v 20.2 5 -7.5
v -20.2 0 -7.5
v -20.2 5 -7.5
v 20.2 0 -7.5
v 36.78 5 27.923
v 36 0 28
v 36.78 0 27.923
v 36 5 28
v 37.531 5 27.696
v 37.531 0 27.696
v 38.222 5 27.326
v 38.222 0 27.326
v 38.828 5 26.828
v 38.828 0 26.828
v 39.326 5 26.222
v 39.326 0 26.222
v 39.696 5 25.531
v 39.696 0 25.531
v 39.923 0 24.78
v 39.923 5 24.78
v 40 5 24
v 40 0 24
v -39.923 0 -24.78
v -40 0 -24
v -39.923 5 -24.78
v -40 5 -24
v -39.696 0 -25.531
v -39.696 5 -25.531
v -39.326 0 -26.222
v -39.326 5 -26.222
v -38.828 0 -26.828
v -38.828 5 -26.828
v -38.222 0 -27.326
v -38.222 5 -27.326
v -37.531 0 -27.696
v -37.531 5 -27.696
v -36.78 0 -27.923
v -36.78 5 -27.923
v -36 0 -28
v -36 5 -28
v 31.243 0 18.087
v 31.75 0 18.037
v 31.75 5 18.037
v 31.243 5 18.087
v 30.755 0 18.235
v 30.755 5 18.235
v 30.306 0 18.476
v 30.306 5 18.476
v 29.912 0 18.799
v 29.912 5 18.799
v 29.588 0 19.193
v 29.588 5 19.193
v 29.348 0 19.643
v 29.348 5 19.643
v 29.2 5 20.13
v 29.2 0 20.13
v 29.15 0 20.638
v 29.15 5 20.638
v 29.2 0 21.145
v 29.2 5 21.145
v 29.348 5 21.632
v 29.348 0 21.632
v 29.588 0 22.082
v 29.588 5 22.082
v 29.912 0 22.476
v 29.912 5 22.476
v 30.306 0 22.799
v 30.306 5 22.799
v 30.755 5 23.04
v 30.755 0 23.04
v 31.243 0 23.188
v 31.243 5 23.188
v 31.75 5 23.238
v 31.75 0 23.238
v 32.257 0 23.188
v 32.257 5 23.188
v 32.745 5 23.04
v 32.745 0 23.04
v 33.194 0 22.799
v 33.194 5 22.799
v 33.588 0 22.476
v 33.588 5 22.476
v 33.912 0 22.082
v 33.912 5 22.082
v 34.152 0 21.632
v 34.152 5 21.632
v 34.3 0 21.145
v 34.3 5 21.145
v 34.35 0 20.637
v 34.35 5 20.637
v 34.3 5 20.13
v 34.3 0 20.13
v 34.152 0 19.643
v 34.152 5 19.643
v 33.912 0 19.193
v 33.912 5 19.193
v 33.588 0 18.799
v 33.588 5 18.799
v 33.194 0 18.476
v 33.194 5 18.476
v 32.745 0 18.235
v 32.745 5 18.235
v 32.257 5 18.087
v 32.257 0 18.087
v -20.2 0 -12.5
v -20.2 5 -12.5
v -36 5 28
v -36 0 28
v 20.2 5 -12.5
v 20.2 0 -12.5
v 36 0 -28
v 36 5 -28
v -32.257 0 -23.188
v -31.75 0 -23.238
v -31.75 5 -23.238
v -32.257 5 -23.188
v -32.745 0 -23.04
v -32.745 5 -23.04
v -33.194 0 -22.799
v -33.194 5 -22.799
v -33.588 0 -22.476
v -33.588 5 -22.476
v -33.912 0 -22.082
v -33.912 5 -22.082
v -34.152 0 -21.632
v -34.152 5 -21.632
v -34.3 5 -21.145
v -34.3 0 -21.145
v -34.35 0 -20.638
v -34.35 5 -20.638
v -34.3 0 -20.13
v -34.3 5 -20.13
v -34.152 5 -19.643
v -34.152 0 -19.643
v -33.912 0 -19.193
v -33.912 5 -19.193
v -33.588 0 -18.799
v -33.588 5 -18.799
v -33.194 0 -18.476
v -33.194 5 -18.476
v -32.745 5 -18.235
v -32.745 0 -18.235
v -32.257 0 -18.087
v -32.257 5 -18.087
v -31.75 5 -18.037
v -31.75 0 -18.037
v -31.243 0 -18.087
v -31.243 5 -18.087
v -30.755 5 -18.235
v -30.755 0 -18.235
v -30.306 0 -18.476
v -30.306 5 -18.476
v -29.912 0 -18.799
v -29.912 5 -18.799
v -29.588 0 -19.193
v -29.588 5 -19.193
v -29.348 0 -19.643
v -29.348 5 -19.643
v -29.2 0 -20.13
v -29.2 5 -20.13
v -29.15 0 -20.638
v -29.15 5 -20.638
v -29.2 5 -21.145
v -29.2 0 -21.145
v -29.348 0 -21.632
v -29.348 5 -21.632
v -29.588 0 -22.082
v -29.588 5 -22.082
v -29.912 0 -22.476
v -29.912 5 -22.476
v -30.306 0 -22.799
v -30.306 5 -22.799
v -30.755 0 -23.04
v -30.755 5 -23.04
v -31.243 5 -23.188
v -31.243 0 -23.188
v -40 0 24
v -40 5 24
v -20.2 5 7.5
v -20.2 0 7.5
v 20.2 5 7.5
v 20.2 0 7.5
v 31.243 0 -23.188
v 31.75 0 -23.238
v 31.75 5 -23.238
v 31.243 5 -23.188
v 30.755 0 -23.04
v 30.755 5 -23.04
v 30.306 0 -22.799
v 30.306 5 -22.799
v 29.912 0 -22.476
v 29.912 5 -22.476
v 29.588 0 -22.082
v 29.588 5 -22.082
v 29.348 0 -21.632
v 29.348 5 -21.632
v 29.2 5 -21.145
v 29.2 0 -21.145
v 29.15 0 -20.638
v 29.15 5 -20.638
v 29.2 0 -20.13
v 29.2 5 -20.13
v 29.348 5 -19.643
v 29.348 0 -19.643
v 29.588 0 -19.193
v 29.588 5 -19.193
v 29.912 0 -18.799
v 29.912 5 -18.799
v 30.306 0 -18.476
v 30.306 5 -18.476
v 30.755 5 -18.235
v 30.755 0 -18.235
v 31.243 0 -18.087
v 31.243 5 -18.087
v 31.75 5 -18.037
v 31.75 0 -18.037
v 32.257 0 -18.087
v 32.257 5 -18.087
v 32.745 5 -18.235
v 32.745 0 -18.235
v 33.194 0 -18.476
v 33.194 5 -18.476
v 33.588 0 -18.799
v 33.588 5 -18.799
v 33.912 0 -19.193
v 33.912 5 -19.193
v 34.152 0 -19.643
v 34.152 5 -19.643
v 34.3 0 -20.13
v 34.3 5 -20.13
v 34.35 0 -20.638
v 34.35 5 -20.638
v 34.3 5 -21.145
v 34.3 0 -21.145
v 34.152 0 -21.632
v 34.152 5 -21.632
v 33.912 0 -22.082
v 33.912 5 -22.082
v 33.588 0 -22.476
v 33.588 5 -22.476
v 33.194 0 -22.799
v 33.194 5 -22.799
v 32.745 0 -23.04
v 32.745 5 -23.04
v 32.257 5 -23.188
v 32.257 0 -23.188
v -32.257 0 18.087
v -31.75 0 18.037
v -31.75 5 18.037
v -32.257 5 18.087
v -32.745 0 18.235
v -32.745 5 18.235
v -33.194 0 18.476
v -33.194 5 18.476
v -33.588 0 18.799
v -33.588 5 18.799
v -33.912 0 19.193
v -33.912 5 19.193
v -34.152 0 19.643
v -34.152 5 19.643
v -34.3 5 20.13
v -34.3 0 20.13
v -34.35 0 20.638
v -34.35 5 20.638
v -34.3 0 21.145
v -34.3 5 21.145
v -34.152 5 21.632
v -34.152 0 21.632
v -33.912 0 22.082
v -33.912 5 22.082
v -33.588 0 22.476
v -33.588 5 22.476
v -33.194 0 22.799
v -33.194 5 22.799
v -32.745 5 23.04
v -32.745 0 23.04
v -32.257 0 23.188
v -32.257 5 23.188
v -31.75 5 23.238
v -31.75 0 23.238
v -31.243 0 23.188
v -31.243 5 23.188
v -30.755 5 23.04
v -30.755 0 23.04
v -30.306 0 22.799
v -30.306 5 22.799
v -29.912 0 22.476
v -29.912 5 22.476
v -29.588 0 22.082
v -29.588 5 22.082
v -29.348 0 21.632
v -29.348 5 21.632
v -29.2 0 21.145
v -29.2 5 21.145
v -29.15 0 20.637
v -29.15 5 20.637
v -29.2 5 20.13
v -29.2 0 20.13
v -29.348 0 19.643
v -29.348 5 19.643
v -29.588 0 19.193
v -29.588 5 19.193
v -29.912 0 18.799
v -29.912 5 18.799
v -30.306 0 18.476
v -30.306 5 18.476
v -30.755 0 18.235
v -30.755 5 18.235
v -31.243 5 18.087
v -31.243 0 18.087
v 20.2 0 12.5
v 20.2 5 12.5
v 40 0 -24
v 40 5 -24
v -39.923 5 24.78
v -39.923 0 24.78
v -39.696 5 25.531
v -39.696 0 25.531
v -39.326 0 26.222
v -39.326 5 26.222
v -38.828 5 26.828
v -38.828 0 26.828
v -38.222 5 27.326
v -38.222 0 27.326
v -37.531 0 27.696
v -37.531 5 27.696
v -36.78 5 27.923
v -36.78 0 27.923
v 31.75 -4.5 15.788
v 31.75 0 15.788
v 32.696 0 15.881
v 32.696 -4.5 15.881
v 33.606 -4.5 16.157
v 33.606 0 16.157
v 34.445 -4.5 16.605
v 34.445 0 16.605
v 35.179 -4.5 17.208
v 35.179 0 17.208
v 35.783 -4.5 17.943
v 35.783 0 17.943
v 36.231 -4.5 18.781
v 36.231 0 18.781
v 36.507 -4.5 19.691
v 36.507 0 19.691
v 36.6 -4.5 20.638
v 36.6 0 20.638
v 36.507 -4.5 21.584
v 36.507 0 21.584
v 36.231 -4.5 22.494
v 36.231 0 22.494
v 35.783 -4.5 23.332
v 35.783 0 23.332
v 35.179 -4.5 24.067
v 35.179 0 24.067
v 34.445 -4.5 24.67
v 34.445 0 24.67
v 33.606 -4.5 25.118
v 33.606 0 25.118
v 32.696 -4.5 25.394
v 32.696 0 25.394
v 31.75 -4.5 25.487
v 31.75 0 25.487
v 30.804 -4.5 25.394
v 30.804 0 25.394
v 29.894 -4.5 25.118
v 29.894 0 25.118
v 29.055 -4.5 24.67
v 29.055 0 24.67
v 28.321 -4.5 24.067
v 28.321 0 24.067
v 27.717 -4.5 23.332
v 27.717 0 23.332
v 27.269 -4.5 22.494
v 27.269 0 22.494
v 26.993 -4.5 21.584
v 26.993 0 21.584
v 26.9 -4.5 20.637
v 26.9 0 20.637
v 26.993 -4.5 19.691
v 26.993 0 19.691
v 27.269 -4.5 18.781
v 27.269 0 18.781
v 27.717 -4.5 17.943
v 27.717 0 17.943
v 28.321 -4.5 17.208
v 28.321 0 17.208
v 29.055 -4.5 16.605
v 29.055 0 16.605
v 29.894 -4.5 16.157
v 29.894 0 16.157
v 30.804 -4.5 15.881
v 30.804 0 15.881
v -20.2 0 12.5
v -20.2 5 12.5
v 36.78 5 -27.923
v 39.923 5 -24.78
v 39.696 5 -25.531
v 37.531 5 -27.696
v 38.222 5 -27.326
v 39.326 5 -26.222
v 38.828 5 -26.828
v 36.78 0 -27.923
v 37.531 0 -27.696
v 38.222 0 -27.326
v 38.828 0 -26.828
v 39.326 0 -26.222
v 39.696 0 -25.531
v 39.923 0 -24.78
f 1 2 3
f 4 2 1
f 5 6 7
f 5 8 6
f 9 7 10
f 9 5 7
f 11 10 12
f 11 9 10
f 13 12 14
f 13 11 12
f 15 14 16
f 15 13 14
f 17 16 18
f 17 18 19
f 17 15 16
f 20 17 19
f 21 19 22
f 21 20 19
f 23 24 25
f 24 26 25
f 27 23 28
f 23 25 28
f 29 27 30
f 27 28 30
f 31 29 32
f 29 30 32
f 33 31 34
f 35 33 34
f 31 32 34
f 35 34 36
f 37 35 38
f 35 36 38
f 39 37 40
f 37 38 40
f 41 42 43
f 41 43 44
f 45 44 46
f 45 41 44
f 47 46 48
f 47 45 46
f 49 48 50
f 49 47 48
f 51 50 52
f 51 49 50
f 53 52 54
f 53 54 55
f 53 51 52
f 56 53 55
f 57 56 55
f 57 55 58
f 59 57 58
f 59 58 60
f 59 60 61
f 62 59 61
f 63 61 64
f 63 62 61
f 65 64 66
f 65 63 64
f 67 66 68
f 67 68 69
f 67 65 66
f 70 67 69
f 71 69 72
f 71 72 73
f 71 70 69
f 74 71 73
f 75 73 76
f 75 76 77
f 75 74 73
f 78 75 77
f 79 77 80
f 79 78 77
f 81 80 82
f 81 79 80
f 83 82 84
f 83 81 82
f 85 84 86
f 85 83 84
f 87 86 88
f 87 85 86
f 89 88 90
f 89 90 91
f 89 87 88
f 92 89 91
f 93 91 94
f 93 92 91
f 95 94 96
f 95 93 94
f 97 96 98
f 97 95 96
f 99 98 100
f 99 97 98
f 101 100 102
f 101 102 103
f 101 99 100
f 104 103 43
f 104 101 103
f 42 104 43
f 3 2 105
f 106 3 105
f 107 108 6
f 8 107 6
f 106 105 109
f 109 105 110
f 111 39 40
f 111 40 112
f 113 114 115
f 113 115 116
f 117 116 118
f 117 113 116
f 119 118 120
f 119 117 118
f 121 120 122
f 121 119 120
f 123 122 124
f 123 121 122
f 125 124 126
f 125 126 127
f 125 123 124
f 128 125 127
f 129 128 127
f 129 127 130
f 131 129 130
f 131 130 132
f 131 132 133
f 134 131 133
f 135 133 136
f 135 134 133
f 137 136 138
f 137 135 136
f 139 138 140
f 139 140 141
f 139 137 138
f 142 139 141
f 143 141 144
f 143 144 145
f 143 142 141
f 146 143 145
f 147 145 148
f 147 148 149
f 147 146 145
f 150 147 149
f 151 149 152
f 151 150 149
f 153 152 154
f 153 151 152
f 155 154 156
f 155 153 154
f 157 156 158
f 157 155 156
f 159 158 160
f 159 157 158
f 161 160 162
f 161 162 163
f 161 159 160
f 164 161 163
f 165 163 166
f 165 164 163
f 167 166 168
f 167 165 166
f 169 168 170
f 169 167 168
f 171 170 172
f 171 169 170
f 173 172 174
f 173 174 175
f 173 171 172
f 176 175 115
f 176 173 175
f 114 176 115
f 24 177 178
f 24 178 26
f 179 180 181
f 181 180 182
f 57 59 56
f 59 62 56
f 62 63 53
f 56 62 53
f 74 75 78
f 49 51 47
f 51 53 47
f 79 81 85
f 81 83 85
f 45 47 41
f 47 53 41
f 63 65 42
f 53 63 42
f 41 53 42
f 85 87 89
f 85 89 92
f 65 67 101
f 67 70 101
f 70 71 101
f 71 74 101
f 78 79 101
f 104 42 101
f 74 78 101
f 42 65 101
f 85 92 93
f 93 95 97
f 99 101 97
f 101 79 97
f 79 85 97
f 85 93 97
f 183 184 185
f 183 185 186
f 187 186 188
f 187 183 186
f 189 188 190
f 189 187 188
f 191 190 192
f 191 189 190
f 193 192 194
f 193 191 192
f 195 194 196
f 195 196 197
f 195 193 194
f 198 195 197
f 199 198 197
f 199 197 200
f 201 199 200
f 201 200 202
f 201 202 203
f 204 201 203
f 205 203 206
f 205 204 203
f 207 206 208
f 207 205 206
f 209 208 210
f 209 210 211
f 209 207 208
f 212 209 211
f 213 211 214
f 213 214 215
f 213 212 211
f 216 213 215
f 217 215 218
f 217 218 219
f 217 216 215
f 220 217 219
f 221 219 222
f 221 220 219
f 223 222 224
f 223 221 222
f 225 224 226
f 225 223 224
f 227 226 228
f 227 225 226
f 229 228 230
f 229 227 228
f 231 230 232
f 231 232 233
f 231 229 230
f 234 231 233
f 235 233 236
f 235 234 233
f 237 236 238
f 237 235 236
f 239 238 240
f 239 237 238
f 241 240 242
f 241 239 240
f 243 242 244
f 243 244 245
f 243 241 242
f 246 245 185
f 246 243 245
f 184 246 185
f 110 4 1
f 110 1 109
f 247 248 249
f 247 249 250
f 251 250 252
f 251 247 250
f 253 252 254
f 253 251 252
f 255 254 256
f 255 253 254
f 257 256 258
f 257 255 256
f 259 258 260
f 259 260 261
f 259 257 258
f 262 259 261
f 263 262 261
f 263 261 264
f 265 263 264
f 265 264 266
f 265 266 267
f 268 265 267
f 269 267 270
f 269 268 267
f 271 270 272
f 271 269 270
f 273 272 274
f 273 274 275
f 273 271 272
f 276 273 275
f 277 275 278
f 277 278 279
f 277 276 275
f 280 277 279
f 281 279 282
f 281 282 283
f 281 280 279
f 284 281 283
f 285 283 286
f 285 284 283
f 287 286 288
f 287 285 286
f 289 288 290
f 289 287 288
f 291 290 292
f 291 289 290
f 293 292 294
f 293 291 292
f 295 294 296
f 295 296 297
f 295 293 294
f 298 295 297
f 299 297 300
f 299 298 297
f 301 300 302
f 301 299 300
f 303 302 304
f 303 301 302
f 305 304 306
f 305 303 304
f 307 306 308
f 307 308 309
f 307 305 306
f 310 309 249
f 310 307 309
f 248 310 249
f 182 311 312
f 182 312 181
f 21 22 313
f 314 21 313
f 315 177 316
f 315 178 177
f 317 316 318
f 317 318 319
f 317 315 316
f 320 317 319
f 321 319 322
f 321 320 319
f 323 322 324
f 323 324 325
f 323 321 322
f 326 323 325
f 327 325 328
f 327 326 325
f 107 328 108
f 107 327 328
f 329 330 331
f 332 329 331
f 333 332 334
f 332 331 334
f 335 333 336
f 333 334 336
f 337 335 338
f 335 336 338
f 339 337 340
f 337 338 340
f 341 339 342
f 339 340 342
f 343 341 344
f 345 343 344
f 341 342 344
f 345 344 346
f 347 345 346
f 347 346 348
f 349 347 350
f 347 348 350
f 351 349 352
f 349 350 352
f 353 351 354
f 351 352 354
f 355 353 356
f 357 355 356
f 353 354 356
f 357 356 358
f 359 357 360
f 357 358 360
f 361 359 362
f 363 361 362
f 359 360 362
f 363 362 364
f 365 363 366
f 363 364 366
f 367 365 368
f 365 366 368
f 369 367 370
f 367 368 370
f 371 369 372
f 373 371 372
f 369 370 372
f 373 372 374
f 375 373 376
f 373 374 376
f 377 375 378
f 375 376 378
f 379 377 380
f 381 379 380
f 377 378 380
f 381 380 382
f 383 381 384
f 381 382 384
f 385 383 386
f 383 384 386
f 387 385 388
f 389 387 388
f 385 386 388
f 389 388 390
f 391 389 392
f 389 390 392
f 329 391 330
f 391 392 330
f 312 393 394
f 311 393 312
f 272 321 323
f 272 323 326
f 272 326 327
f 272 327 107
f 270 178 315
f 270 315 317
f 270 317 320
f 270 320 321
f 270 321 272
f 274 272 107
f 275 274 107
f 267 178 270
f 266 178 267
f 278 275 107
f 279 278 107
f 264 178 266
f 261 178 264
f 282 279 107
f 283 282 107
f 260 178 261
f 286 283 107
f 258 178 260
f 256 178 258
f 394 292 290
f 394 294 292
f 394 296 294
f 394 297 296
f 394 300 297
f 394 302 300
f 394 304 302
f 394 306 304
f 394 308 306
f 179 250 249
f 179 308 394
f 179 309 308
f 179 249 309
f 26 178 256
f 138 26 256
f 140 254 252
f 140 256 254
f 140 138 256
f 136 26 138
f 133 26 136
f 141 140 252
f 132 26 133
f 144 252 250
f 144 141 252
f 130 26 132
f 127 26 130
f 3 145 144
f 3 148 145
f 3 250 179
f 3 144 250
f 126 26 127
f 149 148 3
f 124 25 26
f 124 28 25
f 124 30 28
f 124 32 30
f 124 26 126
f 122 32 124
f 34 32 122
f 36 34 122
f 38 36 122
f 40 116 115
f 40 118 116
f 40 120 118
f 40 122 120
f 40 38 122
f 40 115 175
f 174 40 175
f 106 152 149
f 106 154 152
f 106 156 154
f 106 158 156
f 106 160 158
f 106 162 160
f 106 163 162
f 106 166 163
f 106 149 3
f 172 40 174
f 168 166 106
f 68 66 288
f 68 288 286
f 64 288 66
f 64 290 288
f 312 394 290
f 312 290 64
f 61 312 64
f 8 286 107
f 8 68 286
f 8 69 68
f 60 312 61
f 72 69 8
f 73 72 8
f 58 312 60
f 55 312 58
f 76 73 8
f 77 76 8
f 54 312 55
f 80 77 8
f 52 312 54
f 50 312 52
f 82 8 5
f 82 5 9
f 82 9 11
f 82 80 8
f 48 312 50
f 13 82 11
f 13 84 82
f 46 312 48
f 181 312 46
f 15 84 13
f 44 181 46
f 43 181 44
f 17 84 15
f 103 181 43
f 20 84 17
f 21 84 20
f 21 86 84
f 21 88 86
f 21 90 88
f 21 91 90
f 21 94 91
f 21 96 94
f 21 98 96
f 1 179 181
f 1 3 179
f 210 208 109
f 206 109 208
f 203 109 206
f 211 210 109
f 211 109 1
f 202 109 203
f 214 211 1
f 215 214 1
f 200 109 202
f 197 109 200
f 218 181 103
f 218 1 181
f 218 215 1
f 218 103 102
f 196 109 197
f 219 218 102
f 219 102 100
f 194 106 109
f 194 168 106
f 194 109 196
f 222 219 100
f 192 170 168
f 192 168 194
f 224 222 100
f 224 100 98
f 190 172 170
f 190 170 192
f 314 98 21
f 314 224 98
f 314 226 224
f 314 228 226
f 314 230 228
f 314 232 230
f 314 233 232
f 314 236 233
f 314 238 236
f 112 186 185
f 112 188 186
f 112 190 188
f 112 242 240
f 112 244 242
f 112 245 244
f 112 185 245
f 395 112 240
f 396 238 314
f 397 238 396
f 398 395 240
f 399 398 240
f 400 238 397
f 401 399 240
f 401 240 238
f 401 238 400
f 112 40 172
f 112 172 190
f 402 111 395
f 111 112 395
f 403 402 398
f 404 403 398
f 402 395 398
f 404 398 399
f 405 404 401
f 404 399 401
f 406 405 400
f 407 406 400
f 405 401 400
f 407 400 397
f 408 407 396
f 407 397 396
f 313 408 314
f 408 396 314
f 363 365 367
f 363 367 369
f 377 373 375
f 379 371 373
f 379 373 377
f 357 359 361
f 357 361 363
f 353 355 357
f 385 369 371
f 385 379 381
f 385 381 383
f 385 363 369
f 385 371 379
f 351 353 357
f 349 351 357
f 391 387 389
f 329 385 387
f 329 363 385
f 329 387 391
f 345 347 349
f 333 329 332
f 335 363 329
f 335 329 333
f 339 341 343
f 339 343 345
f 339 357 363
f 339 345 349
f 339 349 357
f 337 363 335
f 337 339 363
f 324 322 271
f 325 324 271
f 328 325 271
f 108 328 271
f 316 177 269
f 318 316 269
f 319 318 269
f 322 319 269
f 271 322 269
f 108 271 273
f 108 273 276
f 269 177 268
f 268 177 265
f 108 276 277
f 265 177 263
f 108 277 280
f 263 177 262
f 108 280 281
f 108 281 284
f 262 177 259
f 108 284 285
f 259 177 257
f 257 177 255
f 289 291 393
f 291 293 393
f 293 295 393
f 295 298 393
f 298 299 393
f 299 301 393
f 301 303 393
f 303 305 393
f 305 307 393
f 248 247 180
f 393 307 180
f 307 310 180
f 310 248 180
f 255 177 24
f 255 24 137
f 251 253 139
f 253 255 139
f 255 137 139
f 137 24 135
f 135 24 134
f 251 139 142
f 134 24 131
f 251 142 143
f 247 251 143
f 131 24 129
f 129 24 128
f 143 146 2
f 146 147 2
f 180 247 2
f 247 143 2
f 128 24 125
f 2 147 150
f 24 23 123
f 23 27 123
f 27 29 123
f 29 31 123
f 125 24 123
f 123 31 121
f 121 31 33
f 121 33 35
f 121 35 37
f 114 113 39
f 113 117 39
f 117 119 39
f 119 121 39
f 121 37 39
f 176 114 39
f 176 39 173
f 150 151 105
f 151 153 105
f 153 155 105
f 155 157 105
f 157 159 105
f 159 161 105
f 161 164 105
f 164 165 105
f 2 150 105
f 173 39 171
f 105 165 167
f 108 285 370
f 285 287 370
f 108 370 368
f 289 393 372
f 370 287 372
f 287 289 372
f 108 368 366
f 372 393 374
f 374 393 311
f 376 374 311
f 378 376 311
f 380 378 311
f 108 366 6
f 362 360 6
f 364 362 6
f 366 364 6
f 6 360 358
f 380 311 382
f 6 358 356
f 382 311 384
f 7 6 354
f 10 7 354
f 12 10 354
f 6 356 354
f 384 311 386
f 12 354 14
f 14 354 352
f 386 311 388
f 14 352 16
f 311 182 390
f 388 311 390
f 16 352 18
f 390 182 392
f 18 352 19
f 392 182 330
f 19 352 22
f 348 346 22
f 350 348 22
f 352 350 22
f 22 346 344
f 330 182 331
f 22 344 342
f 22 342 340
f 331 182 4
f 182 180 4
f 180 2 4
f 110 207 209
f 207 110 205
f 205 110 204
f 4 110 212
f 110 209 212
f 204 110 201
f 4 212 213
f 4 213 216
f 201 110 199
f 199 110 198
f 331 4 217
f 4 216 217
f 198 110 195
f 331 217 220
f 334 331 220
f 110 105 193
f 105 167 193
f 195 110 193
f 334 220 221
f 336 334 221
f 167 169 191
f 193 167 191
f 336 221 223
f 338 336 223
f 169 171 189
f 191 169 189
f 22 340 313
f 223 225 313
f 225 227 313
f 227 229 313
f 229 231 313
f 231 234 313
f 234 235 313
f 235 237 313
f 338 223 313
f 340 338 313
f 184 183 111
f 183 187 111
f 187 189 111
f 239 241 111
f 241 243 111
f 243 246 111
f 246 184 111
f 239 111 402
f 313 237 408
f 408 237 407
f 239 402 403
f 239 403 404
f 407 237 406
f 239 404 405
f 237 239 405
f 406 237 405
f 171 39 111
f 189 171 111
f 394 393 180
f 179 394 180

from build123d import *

# Parameters (mm, degrees)
SKETCH_3_W          = 80
SKETCH_3_H          = 56
EXTRUDE_1_DEPTH     = 5
SKETCH_1_R          = 2.6
SKETCH_1_W          = 40.4
SKETCH_1_H          = 5
CUT_EXTRUDE_1_DEPTH = 5
SKETCH_5_R          = 4.85
EXTRUDE_2_DEPTH     = 4.5
FILLET_2_R          = 4


with BuildPart() as part:
    # 草图3 → 凸台-拉伸1 (new body)
    with BuildSketch(Plane(origin=(0, 0, 0), x_dir=(1, 0, 0), z_dir=(0, 1, 0))):
        Rectangle(SKETCH_3_W, SKETCH_3_H)
    extrude(amount=EXTRUDE_1_DEPTH)

    # 草图1 → 切除-拉伸1 (cut)
    with BuildSketch(Plane(origin=(0, 0, 0), x_dir=(1, 0, 0), z_dir=(0, 1, 0))):
        with Locations(Location((-31.75, 20.6375, 0), (0, 0, 90))):
            Circle(SKETCH_1_R)
        with Locations(Location((31.75, 20.6375, 0), (0, 0, 90))):
            Circle(SKETCH_1_R)
        with Locations(Location((31.75, -20.6375, 0), (0, 0, 90))):
            Circle(SKETCH_1_R)
        with Locations(Location((-31.75, -20.6375, 0), (0, 0, 90))):
            Circle(SKETCH_1_R)
        with Locations((0, -10)):
            Rectangle(SKETCH_1_W, SKETCH_1_H)
        with Locations((0, 10)):
            Rectangle(SKETCH_1_W, SKETCH_1_H)
    extrude(amount=CUT_EXTRUDE_1_DEPTH, mode=Mode.SUBTRACT)

    # 草图5 → 凸台-拉伸2 (add)
    with BuildSketch(Plane.XZ):
        with Locations(Location((31.75, 20.6375, 0), (0, 0, 270))):
            Circle(SKETCH_5_R)
    extrude(amount=EXTRUDE_2_DEPTH)

    # 圆角2
    fillet_2_edges = [part.edges().sort_by_distance(p)[0] for p in [
        (40, 2.5, 28),
        (-40, 2.5, 28),
        (-40, 2.5, -28),
        (40, 2.5, -28),
    ]]
    fillet(fillet_2_edges, radius=FILLET_2_R)


solid = part.part
